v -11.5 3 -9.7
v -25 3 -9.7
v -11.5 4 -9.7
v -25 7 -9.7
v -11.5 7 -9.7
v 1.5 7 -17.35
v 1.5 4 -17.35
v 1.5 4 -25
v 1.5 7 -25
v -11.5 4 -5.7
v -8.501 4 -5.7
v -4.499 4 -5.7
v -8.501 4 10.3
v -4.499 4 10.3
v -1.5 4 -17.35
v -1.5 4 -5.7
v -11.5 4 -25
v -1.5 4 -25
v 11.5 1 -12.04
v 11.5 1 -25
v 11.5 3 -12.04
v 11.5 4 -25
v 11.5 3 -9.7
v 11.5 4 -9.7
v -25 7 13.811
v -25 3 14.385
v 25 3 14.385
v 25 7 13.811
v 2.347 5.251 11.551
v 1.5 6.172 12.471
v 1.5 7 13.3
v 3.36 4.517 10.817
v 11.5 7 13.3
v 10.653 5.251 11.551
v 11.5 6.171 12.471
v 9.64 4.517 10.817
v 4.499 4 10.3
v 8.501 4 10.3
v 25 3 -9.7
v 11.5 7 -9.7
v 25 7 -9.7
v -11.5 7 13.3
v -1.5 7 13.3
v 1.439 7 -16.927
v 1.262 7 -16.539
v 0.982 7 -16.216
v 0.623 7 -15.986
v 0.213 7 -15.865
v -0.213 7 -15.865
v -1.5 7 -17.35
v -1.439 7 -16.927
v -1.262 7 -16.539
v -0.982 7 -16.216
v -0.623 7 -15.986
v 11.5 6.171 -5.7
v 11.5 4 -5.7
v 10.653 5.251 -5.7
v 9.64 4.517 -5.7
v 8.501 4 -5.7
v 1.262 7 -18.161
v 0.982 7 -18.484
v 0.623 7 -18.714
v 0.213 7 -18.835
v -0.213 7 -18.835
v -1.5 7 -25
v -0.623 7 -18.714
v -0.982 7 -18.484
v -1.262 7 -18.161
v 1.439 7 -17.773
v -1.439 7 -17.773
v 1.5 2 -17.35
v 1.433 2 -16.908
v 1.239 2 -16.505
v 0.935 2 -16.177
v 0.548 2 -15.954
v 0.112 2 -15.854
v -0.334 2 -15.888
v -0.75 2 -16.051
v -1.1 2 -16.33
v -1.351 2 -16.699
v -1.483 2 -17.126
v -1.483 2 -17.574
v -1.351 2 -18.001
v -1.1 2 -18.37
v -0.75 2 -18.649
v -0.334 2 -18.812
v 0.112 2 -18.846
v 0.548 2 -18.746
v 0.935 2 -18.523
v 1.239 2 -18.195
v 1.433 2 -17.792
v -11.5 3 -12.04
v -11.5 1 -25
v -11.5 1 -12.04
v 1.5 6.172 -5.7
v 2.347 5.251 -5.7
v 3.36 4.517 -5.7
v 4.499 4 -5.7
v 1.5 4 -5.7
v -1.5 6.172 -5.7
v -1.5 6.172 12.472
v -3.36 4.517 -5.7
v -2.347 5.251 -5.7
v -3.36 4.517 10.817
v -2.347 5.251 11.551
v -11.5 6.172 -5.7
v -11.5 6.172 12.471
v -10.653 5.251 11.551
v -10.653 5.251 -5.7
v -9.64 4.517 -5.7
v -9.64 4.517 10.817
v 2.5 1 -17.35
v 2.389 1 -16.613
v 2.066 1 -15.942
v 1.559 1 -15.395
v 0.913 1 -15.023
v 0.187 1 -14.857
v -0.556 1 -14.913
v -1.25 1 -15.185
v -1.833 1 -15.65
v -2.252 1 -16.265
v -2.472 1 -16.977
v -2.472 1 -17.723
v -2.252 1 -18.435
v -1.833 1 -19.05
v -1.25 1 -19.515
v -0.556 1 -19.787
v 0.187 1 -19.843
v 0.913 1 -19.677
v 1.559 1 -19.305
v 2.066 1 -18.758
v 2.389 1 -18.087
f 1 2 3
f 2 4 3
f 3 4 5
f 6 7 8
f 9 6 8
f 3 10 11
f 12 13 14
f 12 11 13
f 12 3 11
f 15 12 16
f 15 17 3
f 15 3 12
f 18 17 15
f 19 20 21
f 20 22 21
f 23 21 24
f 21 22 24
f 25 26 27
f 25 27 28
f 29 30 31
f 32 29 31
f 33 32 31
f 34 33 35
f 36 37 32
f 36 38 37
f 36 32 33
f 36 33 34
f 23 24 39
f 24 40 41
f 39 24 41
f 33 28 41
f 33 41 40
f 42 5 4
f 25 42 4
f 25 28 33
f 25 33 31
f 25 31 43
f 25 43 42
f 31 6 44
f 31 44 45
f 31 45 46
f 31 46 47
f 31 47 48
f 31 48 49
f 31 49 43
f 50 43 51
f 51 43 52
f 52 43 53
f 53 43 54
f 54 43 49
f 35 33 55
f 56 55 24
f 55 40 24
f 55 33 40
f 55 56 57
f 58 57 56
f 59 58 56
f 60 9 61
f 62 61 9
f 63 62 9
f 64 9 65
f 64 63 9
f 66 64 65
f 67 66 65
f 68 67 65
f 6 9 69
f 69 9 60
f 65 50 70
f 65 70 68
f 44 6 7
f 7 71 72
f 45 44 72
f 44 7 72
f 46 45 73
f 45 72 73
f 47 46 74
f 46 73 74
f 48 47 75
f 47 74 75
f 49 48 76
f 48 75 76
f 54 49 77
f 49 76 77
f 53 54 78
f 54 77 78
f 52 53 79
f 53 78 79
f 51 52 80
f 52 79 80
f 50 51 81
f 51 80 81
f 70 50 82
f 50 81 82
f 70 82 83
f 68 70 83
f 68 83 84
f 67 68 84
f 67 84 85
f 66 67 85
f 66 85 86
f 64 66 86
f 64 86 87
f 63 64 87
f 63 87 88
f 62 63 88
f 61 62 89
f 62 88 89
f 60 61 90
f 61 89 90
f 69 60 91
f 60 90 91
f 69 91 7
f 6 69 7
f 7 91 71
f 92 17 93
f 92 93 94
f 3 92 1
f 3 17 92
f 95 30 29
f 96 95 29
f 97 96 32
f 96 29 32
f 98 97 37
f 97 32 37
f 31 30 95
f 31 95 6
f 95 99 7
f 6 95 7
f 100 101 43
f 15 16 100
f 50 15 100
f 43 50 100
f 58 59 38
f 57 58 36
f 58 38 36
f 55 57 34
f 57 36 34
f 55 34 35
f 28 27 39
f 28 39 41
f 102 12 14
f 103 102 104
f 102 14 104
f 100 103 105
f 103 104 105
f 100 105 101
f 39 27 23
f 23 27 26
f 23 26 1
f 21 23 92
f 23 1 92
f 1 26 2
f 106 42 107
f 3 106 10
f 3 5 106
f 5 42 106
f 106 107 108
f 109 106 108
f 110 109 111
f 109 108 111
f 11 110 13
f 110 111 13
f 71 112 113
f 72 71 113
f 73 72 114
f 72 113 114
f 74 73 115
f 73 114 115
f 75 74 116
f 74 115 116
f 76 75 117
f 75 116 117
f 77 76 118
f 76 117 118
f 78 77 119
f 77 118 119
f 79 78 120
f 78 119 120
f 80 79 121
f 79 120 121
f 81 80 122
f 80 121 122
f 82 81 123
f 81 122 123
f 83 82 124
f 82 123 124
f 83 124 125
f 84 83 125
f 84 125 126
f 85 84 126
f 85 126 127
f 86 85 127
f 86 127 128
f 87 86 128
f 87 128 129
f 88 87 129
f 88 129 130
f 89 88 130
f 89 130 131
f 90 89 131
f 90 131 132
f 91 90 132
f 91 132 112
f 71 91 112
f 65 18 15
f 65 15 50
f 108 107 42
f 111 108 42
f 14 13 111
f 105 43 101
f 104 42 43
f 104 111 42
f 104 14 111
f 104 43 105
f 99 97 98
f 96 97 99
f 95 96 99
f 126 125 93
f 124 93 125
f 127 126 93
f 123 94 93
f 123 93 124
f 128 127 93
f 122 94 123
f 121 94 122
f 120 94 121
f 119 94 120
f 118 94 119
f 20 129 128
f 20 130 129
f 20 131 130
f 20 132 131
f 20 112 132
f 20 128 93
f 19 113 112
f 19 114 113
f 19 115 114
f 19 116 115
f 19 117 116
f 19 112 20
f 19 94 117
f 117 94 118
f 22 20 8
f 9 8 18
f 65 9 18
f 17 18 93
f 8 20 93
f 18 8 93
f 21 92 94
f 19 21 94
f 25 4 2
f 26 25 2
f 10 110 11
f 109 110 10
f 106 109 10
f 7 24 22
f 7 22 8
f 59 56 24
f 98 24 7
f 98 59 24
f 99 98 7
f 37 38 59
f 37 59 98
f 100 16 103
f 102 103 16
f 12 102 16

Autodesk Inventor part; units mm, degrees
ref_plane "YZ Plane" through (0, 0, 0) normal (1, 0, 0) x (0, 1, 0)
ref_plane "XZ Plane" through (0, 0, 0) normal (0, 1, 0) x (-1, 0, 0)
ref_plane "XY Plane" through (0, 0, 0) normal (0, 0, 1) x (1, 0, 0)
sketch "Sketch1" plane through (0, 0, 0) normal (0, 1, 0) x (-1, 0, 0)
  line L0 (-25, -25) -> (25, -25)
  line L1 (25, -25) -> (25, 25)
  line L2 (25, 25) -> (-25, 25)
  line L3 (-25, 25) -> (-25, -25)
  point P0 (0, 0)
  dimension "d2" = 50
  dimension "d3" = 50
extrude "Extrusion1" add sketch "Sketch1" along normal blind 4
sketch "Sketch2" plane through (0, 4, 0) normal (0, 1, 0) x (1, 0, 0)
  line L0 (-25, 25) -> (-25, -25) projected
  line L1 (-25, -25) -> (25, -25) projected
  line L2 (25, -25) -> (25, 25) projected
  line L3 (25, 25) -> (-25, 25) projected
  line L4 (-25, -25) -> (25, -25) projected
  line L5 (0, -25) -> (0, 25)
  line L6 (25, 25) -> (-25, 25) projected
  line L7 (0, -25) -> (-1.5, -25)
  line L8 (-1.5, -25) -> (1.5, -25)
  line L9 (1.5, -25) -> (1.5, 25)
  line L10 (1.5, 25) -> (-1.5, 25)
  line L11 (-1.5, 25) -> (-1.5, -25)
  line L12 (1.5, 9.2284) -> (-1.5, 9.2284)
  line L13 (1.5, 9.2284) -> (-1.5, 9.2284)
  line L14 (-1.5, 9.2284) -> (-1.5, 25)
  line L15 (-1.5, 25) -> (1.5, 25)
  line L16 (1.5, 25) -> (1.5, 9.2284)
  point P0 (0, 0)
  point P1 (1.5, 25)
  dimension "d6" = 1.5
  dimension "d7" = 3
extrude "Extrusion2" add sketch "Sketch2" along normal blind 3 contours L3 L5 L12 L11 | L3 L9 L12 L5
sketch "Sketch3" plane through (0, 4, 0) normal (0, 1, 0) x (1, 0, 0)
  line L0 (1.5, 25) -> (1.5, 9.2284) projected
  line L1 (1.5, 9.2284) -> (-1.5, 9.2284) projected
  line L2 (-1.5, 9.2284) -> (-1.5, 25) projected
  line L3 (-1.5, 25) -> (-25, 25) projected
  line L4 (-25, 25) -> (-25, -25) projected
  line L5 (-25, -25) -> (25, -25) projected
  line L6 (25, -25) -> (25, 25) projected
  line L7 (25, 25) -> (1.5, 25) projected
  line L8 (11.5, 24.5) -> (11.5, 9.7) projected
  line L9 (-11.5, 9.7) -> (-11.5, 24.5) projected
  line L10 (25, 25) -> (1.5, 25) projected
  line L11 (25, 25) -> (11.5, 25)
  line L12 (11.5, 25) -> (11.5, 9.7)
  line L13 (11.5, 9.7) -> (25, 9.7)
  line L14 (25, 9.7) -> (25, 25)
  line L15 (-11.5, 9.7) -> (-25, 9.7)
  line L16 (-25, 9.7) -> (-25, 25)
  line L17 (-25, 25) -> (-11.5, 25)
  line L18 (-11.5, 25) -> (-11.5, 9.7)
  point P0 (0, 0)
extrude "Extrusion3" cut sketch "Sketch3" against normal blind 10 contours L7 L6 L13 L8 L12 | L18 L9 L15 L4 L3
sketch "Sketch4" plane through (0, 0, 0) normal (0, -1, 0) x (1, 0, 0)
  line L0 (-11.5, -9.7) -> (-11.5, -25) projected
  line L1 (11.5, -25) -> (-11.5, -25) projected
  line L2 (11.5, -25) -> (11.5, -9.7) projected
  line L3 (11.5, -9.7) -> (25, -9.7) projected
  line L4 (25, 25) -> (25, -9.7) projected
  line L5 (-25, 25) -> (25, 25) projected
  line L6 (-25, -9.7) -> (-25, 25) projected
  line L7 (-25, -9.7) -> (-11.5, -9.7) projected
  point P0 (0, 0)
extrude "Extrusion4" cut sketch "Sketch4" against normal blind 1
sketch "Sketch5" plane through (-25, 4, 25) normal (0, 0, 1) x (1, 0, 0)
  line L0 (0, -3) -> (50, -3) projected
  line L1 (50, -3) -> (50, 0) projected
  line L2 (0, 0) -> (50, 0) projected
  line L3 (0, -3) -> (0, 0) projected
  line L4 (0, 0) -> (50, 0) projected
  line L5 (0, 0) -> (50, 0)
  line L6 (50, 0) -> (50, 3)
  line L7 (50, 3) -> (0, 3)
  line L8 (0, 3) -> (0, 0)
  point P0 (25, -4)
  dimension "d14" = 3
extrude "Extrusion5" add sketch "Sketch5" against normal up to surface (34.7 mm away) contours L8 L7 L6 L2
sketch "Sketch6" plane through (11.5, 4, -9.7) normal (0, 0, -1) x (-1, 0, 0)
  line L0 (-13.5, -3) -> (0, -3) projected
  line L1 (0, 0) -> (0, -3) projected
  line L2 (10, 0) -> (0, 0) projected
  line L3 (10, 3) -> (10, 0) projected
  line L4 (10, 3) -> (-13.5, 3) projected
  line L5 (-13.5, -3) -> (-13.5, 3) projected
  line L6 (23, -3) -> (36.5, -3) projected
  line L7 (36.5, 3) -> (36.5, -3) projected
  line L8 (36.5, 3) -> (13, 3) projected
  line L9 (13, 0) -> (13, 3) projected
  line L10 (23, 0) -> (13, 0) projected
  line L11 (23, 0) -> (23, -3) projected
  line L12 (0, 0.5) -> (0, 11.5) projected
  line L13 (23, 11.5) -> (23, 0.5) projected
  line L14 (10, 0) -> (0, 0) projected
  line L15 (0, 11.5) -> (0, 0)
  line L16 (23, 11.5) -> (23, 0)
  line L17 (0, 0) -> (0, -3) projected
  line L18 (10, 3) -> (-13.5, 3) projected
  line L19 (0, 0) -> (10, 0)
  line L20 (10, 0) -> (10, 3)
  line L21 (10, 3) -> (0, 3)
  line L22 (0, 3) -> (0, 0)
  line L23 (13, 0) -> (13, 3) projected
  line L24 (23, 0) -> (23, -3) projected
  line L25 (13, 3) -> (23, 3)
  line L26 (23, 3) -> (23, 0)
  line L27 (23, 0) -> (13, 0)
  line L28 (13, 0) -> (13, 3)
  point P0 (11.5, -4)
  point P1 (23, 0.5)
  point P2 (0, 3)
extrude "Extrusion6" cut sketch "Sketch6" against normal blind 20 contours L15 L12 L4 L3 L2 | L10 L9 L8 L13 L16
sketch "Sketch7" plane through (11.5, 4, 10.3) normal (0, 0, -1) x (-1, 0, 0)
  arc A0 (0, 2.75) -> (10, 2.7503) centre (4.9999, 5.9206) ccw projected
  arc A1 (13, 2.75) -> (23, 2.7497) centre (18.0001, 5.9203) ccw projected
  line L0 (0, 0) -> (10, 0) projected
  line L1 (5, 0) -> (5, -0.3289)
  line L2 (5, -0.3289) -> (19.1354, -0.3289)
  circle A2 centre (4.9999, 5.9206) radius 6.2495
  circle A3 centre (18.0001, 5.9203) radius 6.2492
  line L3 (0, 3) -> (-13.5, 3) projected
  line L4 (0, 3) -> (10, 3)
  line L5 (10, 3) -> (10, 0)
  line L6 (10, 0) -> (0, 0)
  line L7 (0, 0) -> (0, 3)
  line L8 (13, 0) -> (13, 3) projected
  line L9 (23, 3) -> (23, 0) projected
  line L10 (13, 0) -> (23, 0)
  line L11 (23, 0) -> (23, 3)
  line L12 (23, 3) -> (13, 3)
  line L13 (13, 3) -> (13, 0)
  point P0 (11.5, -4)
  point P1 (20.0008, 0)
  point P2 (23, 2.1715)
  point P3 (15.9994, 0)
  point P4 (13, 2.1717)
  point P5 (10, 2.1715)
  point P6 (7.0007, 0)
  point P7 (0, 2.1713)
  point P8 (2.9992, 0)
extrude "Extrusion7" add sketch "Sketch7" along normal blind 16 contours A2 L0 L7 | A2 L5 L0 | A3 L10 L8 | A3 L9 L10
chamfer "Chamfer1" distance 3 angle 45 2 edges at (6.5, 7, 10.3) (-6.5, 7, 10.3)
sketch "Sketch8" plane through (-25, 7, -9.7) normal (-1, 0, 0) x (0, 0, 1)
  circle A0 centre (-11.34, 3) radius 8 projected
  line L0 (0, -6) -> (34.7, -6) projected
  line L1 (34.7, -6) -> (34.7, 0) projected
  line L2 (34.7, 0) -> (0, 0) projected
  line L3 (0, 0) -> (0, -6) projected
  line L4 (-11.34, 3) -> (-19.34, 3)
  line L5 (-19.34, 3) -> (-22.34, 3)
  line L6 (-22.34, 3) -> (27.66, 3)
  line L7 (0, -6) -> (34.7, -6) projected
  line L8 (34.7, -6) -> (27.66, -6)
  line L9 (27.66, -6) -> (27.66, 9.5427)
  line L10 (27.66, 9.5427) -> (34.7, 9.5427)
  line L11 (34.7, 9.5427) -> (34.7, -6)
  point P0 (9.7, -7)
  point P1 (27.66, 0)
  dimension "d24" = 3
  dimension "d25" = 50
extrude "Extrusion8" cut sketch "Sketch8" against normal through all contours L9 L2 L1 L0
sketch "Sketch9" plane through (25, 1, -9.7) normal (1, 0, 0) x (0, 0, -1)
  line L0 (-27.66, 6) -> (-27.66, 0) projected
  line L1 (-27.66, 0) -> (0, 0) projected
  line L2 (0, 0) -> (0, 6) projected
  line L3 (-27.66, 6) -> (0, 6) projected
  line L4 (-27.66, 0.31) -> (-25.7682, 0.01) projected
  line L5 (-25.7682, 0.01) -> (-14.0234, 0.01) projected
  line L6 (-14.0234, 0.01) -> (-14.0234, 0.61) projected
  line L7 (-25.7682, 0.61) -> (-14.0234, 0.61) projected
  line L8 (-25.7682, 0.61) -> (-27.66, 0.31) projected
  line L9 (-27.66, 0) -> (-27.66, 6) projected
  line L10 (-14.0234, 0.61) -> (-27.66, 0.61)
  line L11 (-27.66, 0.61) -> (-27.66, 1.22)
  line L12 (-27.66, 1.22) -> (-14.0234, 1.22)
  line L13 (-14.0234, 1.22) -> (-14.0234, 0.61)
  point P0 (-9.7, -1)
  point P1 (-27.66, 1.22)
  dimension "d28" = 0.61
extrude "Extrusion9" cut sketch "Sketch9" against normal through all contours L12 L13 L7 L10 L0
sketch "Sketch10" plane through (25, 1, -9.7) normal (1, 0, 0) x (0, 0, -1)
  line L0 (-27.66, 0.31) -> (-25.7682, 0.01) projected
  line L1 (-25.7682, 0.01) -> (-14.0234, 0.01) projected
  line L2 (-14.0234, 0.01) -> (-14.0234, 0.61) projected
  line L3 (-25.7682, 0.61) -> (-14.0234, 0.61) projected
  line L4 (-25.7682, 0.61) -> (-27.66, 0.31) projected
  line L5 (-14.0234, 1.22) -> (-14.0234, 0.61) projected
  line L6 (-27.66, 0) -> (0, 0) projected
  line L7 (0, 0) -> (0, 6) projected
  line L8 (-27.66, 6) -> (0, 6) projected
  line L9 (-27.66, 6) -> (-27.66, 1.22) projected
  line L10 (-27.66, 1.22) -> (-14.0234, 1.22) projected
  line L11 (-25.7682, 0.61) -> (-25.7682, 6)
  line L12 (-27.66, 6) -> (0, 6) projected
  line L13 (-19.9, 5.7) -> (-19.9, 6.1)
  line L14 (15.3, 6) -> (-23, 6) projected
  line L15 (-19.9, 6) -> (-20.9, 6)
  line L16 (-20.9, 6) -> (-23.9, 6)
  line L17 (-25.7682, 0.61) -> (-23.9, 6)
  line L18 (-14.0234, 0.61) -> (-27.66, 0.61) projected
  line L19 (-27.66, 0.61) -> (-27.66, 0) projected
  point P0 (-9.7, -1)
  point P1 (-25.5568, 1.22)
  dimension "d31" = 1
  dimension "d32" = 3
extrude "Extrusion10" cut sketch "Sketch10" against normal through all contours L11 L8 L17 L10 | L10 L9 L8 L11
sketch "Sketch11" plane through (0, 1, 0) normal (0, -1, 0) x (1, 0, 0)
  circle A0 centre (0, -17.35) radius 1.5 projected
  line L0 (3.695, -17.35) -> (1.8475, -14.15) projected
  line L1 (1.8475, -20.55) -> (3.695, -17.35) projected
  line L2 (-1.8475, -20.55) -> (1.8475, -20.55) projected
  line L3 (-3.695, -17.35) -> (-1.8475, -20.55) projected
  line L4 (-1.8475, -14.15) -> (-3.695, -17.35) projected
  line L5 (1.8475, -14.15) -> (-1.8475, -14.15) projected
  circle A1 centre (0, -17.35) radius 1.5 projected
  line L6 (-25, -10.04) -> (-25, -32.04) projected
  point P0 (0, 0)
extrude "Extrusion11" cut sketch "Sketch11" against normal through all contours A0
chamfer "Chamfer2" distance 1 angle 45 1 edges at (-1.5, 1, -17.35)
sketch "Sketch12" plane through (-25, 1, -9.7) normal (-1, 0, 0) x (0, 0, 1)
  line L0 (25.5568, 1.22) -> (23.9, 6) projected
  line L1 (23.9, 6) -> (0, 6) projected
  line L2 (0, 6) -> (0, 0) projected
  line L3 (0, 0) -> (27.66, 0) projected
  line L4 (27.66, 0) -> (27.66, 0.61) projected
  line L5 (27.66, 0.61) -> (14.0234, 0.61) projected
  line L6 (14.0234, 0.61) -> (14.0234, 1.22) projected
  line L7 (14.0234, 1.22) -> (25.5568, 1.22) projected
  circle A0 centre (-11.34, 9) radius 11 projected
  line L8 (-22.34, 9) -> (27.66, 9)
  line L9 (27.66, 9) -> (27.66, -12.93)
  line L10 (-11.34, 9) -> (-11.34, -2)
  line L11 (-11.34, -2) -> (27.66, -1.965)
  line L12 (14.0234, 1.22) -> (25.5568, 1.22) projected
  line L13 (27.66, -1.3745) -> (14.0234, 1.22)
  line L14 (14.0234, 1.22) -> (14.0795, 1.5147)
  line L15 (14.0234, 1.22) -> (13.9673, 0.9253)
  line L16 (14.0795, 1.5147) -> (28.9229, -1.3094)
  line L17 (13.9673, 0.9253) -> (29.035, -1.9638)
  line L18 (25.5568, 1.22) -> (24.566, 4.0785)
  line L19 (25.5568, 1.22) -> (23.9, 6) projected
  line L20 (25.5568, 1.22) -> (26.2577, -0.8023)
  point P0 (9.7, -1)
  point P1 (15.6117, 0.61)
  point P2 (14.0234, 0.9145)
  point P3 (15.6285, 1.22)
  dimension "d40" = 0.3
  dimension "d41" = 0.3
extrude "Extrusion12" add sketch "Sketch12" against normal blind 50 contours L20 L5 L16 L7 | L20 L3 L16 L5 | L20 L16 L3 | L17 L5 L6
sketch "Sketch13" plane through (-25, 1, -9.7) normal (-1, 0, 0) x (0, 0, 1)
  line L0 (18.8347, 0.61) -> (15.6117, 0.61) projected
  line L1 (15.6117, 0.61) -> (14.0234, 0.9145) projected
  line L2 (14.0234, 0.9145) -> (14.0234, 1.22) projected
  line L3 (14.0234, 1.22) -> (15.6285, 1.22) projected
  line L4 (15.6285, 1.22) -> (18.8347, 0.61) projected
  line L5 (25.7682, 0.61) -> (23.9, 6) projected
  line L6 (23.9, 6) -> (0, 6) projected
  line L7 (0, 6) -> (0, 0) projected
  line L8 (0, 0) -> (22.0408, 0) projected
  line L9 (22.0408, 0) -> (26.2577, -0.8023) projected
  line L10 (26.2577, -0.8023) -> (25.9796, 0) projected
  line L11 (25.9796, 0) -> (27.66, 0) projected
  line L12 (27.66, 0) -> (27.66, 0.61) projected
  line L13 (27.66, 0.61) -> (25.7682, 0.61) projected
  line L14 (14.0234, 0.9145) -> (14.0234, 1.22) projected
  line L15 (14.0234, 0.9145) -> (26.7141, -1.5188)
  line L16 (14.0234, 1.22) -> (15.6285, 1.22) projected
  line L17 (15.6285, 1.22) -> (29.31, -1.383)
  line L18 (14.0234, 0.9145) -> (13.2268, 1.0673)
  line L19 (13.2268, 1.0673) -> (13.3704, 1.8159)
  line L20 (15.6285, 1.22) -> (13.3396, 1.6555)
  line L21 (25.9796, 0) -> (27.66, 0) projected
  line L22 (25.9796, 0) -> (25.7682, 0.61)
  line L23 (26.7141, -1.5188) -> (27.0047, -0.9444)
  point P0 (9.7, -1)
  point P1 (18.7931, 0)
extrude "Extrusion13" cut sketch "Sketch13" against normal through all contours L17 L8 L15 L0 | L3 L2 L18 L19 L20 | L22 L13 L12 L11
sketch "Sketch14" plane through (-25, 1, -9.7) normal (-1, 0, 0) x (0, 0, 1)
  line L0 (26.2577, -0.8023) -> (23.9, 6) projected
  line L1 (23.9, 6) -> (0, 6) projected
  line L2 (0, 6) -> (0, 0) projected
  line L3 (0, 0) -> (18.7931, 0) projected
  line L4 (18.7931, 0) -> (13.2268, 1.0673) projected
  line L5 (13.2268, 1.0673) -> (13.3396, 1.6555) projected
  line L6 (13.3396, 1.6555) -> (26.2577, -0.8023) projected
  circle A0 centre (-11.34, 9) radius 11 projected
  line L7 (-22.34, 9) -> (27.66, 9)
  line L8 (-11.34, 9) -> (-11.34, -2)
  line L9 (-11.34, 9) -> (27.66, 9)
  line L10 (27.66, 9) -> (27.66, -2)
  line L11 (27.66, -2) -> (-11.34, -2)
  line L12 (-11.34, -2) -> (-11.34, 9)
  line L13 (4, 3) -> (-7.65, 3) projected
  line L14 (-7.65, 3) -> (-15.3, 3) projected
  line L15 (-15.3, 3) -> (0, 3) projected
  line L16 (0, 3) -> (4, 3) projected
  line L17 (4, 3) -> (20, 3) projected
  line L18 (20, 3) -> (4, 3) projected
  line L19 (0, 3) -> (-15.3, 3) projected
  line L20 (0, 3) -> (20, 3)
  line L21 (20, 3) -> (20, 2)
  line L22 (20, 2) -> (0, 2)
  line L23 (0, 2) -> (0, 3)
  line L24 (22.1715, 5.1715) -> (20, 3) projected
  line L25 (20, 3) -> (29.0462, 3)
  line L26 (29.0462, 3) -> (29.0462, 2)
  line L27 (29.0462, 2) -> (20, 2)
  line L28 (20, 2) -> (20, 3)
  line L29 (27.66, 2) -> (-2.34, 2)
  line L30 (-2.34, 2) -> (-2.34, -1)
  line L31 (-2.34, -1) -> (27.66, -1)
  line L32 (27.66, -1) -> (27.66, 2)
  line L33 (27.66, -1) -> (24.0847, 2)
  line L34 (26.2577, -0.8023) -> (23.9, 6) projected
  line L35 (24.0847, 2) -> (23.5108, 6)
  line L36 (23.9, 6) -> (0, 6) projected
  point P0 (9.7, -1)
  point P1 (24.0847, 2)
  point P2 (25.7792, 0.5781)
  dimension "d46" = 50
  dimension "d47" = 1
  dimension "d48" = 30
  dimension "d49" = 3
  dimension "d50" = 40
extrude "Extrusion14" cut sketch "Sketch14" against normal through all contours L6 L5 L4 L3 L2 L22 L27 L33 L0 | L0 L33 L31 L30 L29 L2 L3 L4 L5 L6 | L33 L27 L0 | L27 L35 L25 L0 | L25 L35 L1 L0
properties part number "podsta"
